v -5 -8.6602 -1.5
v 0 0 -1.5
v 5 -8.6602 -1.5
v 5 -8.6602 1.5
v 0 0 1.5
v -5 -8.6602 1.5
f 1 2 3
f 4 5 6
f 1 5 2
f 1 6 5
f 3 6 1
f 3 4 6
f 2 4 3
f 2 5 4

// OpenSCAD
// Nathanael Lane
// 2015.1.22


/*
 * -h: height of prism
 * -b: length of base
 * -d: base-to-apex distance
 * -s: side length
 * -a: angle of apex corner
 * -if more than two of b, d, s, and a are defined, the outcome is undefined
 */
module _triangle(b = 0, d = 0, s = 0, a = 0, base_origin = false){
	
	adBase = tan(a / 2) * d * 2;
	asBase = sin(a / 2) * s * 2;
	dsBase = sqrt((s * s) - (d * d));
	abHeight = (b / 2) / tan(a / 2);
	asHeight = cos(a / 2) * s;
	bsHeight = sqrt((s * s) - (b * b));

	baseLUT = [b, asBase, b, adBase, b, dsBase];
	heightLUT = [abHeight, asHeight, bsHeight, d, d, d];

	base = baseLUT[
		min((sign(b) + sign(s) * 2 + sign(d) * 4) - 1, 5)
	];
	height = heightLUT[
		min((sign(b) + sign(s) * 2 + sign(d) * 4) - 1, 5)
	];

	translate([0, base_origin ? height : 0, 0])
			polygon([
				[0, 0], 
				[base / 2, -height], 
				[-base / 2, -height]
			]);	
}

module triangle(h = 1, b = 0, d = 0, s = 0, a = 0, base_origin = false, center = false){

	translate([0, 0, center ? -h /2 : 0])
		linear_extrude(height = h)
			_triangle(b = b, d = d, s = s, a = a, base_origin = base_origin);	
}


$fa = 5;
$fs = 0.05;

triangle(h = 3, b = 10, a = 60, baseOrigin = true, center = true);
